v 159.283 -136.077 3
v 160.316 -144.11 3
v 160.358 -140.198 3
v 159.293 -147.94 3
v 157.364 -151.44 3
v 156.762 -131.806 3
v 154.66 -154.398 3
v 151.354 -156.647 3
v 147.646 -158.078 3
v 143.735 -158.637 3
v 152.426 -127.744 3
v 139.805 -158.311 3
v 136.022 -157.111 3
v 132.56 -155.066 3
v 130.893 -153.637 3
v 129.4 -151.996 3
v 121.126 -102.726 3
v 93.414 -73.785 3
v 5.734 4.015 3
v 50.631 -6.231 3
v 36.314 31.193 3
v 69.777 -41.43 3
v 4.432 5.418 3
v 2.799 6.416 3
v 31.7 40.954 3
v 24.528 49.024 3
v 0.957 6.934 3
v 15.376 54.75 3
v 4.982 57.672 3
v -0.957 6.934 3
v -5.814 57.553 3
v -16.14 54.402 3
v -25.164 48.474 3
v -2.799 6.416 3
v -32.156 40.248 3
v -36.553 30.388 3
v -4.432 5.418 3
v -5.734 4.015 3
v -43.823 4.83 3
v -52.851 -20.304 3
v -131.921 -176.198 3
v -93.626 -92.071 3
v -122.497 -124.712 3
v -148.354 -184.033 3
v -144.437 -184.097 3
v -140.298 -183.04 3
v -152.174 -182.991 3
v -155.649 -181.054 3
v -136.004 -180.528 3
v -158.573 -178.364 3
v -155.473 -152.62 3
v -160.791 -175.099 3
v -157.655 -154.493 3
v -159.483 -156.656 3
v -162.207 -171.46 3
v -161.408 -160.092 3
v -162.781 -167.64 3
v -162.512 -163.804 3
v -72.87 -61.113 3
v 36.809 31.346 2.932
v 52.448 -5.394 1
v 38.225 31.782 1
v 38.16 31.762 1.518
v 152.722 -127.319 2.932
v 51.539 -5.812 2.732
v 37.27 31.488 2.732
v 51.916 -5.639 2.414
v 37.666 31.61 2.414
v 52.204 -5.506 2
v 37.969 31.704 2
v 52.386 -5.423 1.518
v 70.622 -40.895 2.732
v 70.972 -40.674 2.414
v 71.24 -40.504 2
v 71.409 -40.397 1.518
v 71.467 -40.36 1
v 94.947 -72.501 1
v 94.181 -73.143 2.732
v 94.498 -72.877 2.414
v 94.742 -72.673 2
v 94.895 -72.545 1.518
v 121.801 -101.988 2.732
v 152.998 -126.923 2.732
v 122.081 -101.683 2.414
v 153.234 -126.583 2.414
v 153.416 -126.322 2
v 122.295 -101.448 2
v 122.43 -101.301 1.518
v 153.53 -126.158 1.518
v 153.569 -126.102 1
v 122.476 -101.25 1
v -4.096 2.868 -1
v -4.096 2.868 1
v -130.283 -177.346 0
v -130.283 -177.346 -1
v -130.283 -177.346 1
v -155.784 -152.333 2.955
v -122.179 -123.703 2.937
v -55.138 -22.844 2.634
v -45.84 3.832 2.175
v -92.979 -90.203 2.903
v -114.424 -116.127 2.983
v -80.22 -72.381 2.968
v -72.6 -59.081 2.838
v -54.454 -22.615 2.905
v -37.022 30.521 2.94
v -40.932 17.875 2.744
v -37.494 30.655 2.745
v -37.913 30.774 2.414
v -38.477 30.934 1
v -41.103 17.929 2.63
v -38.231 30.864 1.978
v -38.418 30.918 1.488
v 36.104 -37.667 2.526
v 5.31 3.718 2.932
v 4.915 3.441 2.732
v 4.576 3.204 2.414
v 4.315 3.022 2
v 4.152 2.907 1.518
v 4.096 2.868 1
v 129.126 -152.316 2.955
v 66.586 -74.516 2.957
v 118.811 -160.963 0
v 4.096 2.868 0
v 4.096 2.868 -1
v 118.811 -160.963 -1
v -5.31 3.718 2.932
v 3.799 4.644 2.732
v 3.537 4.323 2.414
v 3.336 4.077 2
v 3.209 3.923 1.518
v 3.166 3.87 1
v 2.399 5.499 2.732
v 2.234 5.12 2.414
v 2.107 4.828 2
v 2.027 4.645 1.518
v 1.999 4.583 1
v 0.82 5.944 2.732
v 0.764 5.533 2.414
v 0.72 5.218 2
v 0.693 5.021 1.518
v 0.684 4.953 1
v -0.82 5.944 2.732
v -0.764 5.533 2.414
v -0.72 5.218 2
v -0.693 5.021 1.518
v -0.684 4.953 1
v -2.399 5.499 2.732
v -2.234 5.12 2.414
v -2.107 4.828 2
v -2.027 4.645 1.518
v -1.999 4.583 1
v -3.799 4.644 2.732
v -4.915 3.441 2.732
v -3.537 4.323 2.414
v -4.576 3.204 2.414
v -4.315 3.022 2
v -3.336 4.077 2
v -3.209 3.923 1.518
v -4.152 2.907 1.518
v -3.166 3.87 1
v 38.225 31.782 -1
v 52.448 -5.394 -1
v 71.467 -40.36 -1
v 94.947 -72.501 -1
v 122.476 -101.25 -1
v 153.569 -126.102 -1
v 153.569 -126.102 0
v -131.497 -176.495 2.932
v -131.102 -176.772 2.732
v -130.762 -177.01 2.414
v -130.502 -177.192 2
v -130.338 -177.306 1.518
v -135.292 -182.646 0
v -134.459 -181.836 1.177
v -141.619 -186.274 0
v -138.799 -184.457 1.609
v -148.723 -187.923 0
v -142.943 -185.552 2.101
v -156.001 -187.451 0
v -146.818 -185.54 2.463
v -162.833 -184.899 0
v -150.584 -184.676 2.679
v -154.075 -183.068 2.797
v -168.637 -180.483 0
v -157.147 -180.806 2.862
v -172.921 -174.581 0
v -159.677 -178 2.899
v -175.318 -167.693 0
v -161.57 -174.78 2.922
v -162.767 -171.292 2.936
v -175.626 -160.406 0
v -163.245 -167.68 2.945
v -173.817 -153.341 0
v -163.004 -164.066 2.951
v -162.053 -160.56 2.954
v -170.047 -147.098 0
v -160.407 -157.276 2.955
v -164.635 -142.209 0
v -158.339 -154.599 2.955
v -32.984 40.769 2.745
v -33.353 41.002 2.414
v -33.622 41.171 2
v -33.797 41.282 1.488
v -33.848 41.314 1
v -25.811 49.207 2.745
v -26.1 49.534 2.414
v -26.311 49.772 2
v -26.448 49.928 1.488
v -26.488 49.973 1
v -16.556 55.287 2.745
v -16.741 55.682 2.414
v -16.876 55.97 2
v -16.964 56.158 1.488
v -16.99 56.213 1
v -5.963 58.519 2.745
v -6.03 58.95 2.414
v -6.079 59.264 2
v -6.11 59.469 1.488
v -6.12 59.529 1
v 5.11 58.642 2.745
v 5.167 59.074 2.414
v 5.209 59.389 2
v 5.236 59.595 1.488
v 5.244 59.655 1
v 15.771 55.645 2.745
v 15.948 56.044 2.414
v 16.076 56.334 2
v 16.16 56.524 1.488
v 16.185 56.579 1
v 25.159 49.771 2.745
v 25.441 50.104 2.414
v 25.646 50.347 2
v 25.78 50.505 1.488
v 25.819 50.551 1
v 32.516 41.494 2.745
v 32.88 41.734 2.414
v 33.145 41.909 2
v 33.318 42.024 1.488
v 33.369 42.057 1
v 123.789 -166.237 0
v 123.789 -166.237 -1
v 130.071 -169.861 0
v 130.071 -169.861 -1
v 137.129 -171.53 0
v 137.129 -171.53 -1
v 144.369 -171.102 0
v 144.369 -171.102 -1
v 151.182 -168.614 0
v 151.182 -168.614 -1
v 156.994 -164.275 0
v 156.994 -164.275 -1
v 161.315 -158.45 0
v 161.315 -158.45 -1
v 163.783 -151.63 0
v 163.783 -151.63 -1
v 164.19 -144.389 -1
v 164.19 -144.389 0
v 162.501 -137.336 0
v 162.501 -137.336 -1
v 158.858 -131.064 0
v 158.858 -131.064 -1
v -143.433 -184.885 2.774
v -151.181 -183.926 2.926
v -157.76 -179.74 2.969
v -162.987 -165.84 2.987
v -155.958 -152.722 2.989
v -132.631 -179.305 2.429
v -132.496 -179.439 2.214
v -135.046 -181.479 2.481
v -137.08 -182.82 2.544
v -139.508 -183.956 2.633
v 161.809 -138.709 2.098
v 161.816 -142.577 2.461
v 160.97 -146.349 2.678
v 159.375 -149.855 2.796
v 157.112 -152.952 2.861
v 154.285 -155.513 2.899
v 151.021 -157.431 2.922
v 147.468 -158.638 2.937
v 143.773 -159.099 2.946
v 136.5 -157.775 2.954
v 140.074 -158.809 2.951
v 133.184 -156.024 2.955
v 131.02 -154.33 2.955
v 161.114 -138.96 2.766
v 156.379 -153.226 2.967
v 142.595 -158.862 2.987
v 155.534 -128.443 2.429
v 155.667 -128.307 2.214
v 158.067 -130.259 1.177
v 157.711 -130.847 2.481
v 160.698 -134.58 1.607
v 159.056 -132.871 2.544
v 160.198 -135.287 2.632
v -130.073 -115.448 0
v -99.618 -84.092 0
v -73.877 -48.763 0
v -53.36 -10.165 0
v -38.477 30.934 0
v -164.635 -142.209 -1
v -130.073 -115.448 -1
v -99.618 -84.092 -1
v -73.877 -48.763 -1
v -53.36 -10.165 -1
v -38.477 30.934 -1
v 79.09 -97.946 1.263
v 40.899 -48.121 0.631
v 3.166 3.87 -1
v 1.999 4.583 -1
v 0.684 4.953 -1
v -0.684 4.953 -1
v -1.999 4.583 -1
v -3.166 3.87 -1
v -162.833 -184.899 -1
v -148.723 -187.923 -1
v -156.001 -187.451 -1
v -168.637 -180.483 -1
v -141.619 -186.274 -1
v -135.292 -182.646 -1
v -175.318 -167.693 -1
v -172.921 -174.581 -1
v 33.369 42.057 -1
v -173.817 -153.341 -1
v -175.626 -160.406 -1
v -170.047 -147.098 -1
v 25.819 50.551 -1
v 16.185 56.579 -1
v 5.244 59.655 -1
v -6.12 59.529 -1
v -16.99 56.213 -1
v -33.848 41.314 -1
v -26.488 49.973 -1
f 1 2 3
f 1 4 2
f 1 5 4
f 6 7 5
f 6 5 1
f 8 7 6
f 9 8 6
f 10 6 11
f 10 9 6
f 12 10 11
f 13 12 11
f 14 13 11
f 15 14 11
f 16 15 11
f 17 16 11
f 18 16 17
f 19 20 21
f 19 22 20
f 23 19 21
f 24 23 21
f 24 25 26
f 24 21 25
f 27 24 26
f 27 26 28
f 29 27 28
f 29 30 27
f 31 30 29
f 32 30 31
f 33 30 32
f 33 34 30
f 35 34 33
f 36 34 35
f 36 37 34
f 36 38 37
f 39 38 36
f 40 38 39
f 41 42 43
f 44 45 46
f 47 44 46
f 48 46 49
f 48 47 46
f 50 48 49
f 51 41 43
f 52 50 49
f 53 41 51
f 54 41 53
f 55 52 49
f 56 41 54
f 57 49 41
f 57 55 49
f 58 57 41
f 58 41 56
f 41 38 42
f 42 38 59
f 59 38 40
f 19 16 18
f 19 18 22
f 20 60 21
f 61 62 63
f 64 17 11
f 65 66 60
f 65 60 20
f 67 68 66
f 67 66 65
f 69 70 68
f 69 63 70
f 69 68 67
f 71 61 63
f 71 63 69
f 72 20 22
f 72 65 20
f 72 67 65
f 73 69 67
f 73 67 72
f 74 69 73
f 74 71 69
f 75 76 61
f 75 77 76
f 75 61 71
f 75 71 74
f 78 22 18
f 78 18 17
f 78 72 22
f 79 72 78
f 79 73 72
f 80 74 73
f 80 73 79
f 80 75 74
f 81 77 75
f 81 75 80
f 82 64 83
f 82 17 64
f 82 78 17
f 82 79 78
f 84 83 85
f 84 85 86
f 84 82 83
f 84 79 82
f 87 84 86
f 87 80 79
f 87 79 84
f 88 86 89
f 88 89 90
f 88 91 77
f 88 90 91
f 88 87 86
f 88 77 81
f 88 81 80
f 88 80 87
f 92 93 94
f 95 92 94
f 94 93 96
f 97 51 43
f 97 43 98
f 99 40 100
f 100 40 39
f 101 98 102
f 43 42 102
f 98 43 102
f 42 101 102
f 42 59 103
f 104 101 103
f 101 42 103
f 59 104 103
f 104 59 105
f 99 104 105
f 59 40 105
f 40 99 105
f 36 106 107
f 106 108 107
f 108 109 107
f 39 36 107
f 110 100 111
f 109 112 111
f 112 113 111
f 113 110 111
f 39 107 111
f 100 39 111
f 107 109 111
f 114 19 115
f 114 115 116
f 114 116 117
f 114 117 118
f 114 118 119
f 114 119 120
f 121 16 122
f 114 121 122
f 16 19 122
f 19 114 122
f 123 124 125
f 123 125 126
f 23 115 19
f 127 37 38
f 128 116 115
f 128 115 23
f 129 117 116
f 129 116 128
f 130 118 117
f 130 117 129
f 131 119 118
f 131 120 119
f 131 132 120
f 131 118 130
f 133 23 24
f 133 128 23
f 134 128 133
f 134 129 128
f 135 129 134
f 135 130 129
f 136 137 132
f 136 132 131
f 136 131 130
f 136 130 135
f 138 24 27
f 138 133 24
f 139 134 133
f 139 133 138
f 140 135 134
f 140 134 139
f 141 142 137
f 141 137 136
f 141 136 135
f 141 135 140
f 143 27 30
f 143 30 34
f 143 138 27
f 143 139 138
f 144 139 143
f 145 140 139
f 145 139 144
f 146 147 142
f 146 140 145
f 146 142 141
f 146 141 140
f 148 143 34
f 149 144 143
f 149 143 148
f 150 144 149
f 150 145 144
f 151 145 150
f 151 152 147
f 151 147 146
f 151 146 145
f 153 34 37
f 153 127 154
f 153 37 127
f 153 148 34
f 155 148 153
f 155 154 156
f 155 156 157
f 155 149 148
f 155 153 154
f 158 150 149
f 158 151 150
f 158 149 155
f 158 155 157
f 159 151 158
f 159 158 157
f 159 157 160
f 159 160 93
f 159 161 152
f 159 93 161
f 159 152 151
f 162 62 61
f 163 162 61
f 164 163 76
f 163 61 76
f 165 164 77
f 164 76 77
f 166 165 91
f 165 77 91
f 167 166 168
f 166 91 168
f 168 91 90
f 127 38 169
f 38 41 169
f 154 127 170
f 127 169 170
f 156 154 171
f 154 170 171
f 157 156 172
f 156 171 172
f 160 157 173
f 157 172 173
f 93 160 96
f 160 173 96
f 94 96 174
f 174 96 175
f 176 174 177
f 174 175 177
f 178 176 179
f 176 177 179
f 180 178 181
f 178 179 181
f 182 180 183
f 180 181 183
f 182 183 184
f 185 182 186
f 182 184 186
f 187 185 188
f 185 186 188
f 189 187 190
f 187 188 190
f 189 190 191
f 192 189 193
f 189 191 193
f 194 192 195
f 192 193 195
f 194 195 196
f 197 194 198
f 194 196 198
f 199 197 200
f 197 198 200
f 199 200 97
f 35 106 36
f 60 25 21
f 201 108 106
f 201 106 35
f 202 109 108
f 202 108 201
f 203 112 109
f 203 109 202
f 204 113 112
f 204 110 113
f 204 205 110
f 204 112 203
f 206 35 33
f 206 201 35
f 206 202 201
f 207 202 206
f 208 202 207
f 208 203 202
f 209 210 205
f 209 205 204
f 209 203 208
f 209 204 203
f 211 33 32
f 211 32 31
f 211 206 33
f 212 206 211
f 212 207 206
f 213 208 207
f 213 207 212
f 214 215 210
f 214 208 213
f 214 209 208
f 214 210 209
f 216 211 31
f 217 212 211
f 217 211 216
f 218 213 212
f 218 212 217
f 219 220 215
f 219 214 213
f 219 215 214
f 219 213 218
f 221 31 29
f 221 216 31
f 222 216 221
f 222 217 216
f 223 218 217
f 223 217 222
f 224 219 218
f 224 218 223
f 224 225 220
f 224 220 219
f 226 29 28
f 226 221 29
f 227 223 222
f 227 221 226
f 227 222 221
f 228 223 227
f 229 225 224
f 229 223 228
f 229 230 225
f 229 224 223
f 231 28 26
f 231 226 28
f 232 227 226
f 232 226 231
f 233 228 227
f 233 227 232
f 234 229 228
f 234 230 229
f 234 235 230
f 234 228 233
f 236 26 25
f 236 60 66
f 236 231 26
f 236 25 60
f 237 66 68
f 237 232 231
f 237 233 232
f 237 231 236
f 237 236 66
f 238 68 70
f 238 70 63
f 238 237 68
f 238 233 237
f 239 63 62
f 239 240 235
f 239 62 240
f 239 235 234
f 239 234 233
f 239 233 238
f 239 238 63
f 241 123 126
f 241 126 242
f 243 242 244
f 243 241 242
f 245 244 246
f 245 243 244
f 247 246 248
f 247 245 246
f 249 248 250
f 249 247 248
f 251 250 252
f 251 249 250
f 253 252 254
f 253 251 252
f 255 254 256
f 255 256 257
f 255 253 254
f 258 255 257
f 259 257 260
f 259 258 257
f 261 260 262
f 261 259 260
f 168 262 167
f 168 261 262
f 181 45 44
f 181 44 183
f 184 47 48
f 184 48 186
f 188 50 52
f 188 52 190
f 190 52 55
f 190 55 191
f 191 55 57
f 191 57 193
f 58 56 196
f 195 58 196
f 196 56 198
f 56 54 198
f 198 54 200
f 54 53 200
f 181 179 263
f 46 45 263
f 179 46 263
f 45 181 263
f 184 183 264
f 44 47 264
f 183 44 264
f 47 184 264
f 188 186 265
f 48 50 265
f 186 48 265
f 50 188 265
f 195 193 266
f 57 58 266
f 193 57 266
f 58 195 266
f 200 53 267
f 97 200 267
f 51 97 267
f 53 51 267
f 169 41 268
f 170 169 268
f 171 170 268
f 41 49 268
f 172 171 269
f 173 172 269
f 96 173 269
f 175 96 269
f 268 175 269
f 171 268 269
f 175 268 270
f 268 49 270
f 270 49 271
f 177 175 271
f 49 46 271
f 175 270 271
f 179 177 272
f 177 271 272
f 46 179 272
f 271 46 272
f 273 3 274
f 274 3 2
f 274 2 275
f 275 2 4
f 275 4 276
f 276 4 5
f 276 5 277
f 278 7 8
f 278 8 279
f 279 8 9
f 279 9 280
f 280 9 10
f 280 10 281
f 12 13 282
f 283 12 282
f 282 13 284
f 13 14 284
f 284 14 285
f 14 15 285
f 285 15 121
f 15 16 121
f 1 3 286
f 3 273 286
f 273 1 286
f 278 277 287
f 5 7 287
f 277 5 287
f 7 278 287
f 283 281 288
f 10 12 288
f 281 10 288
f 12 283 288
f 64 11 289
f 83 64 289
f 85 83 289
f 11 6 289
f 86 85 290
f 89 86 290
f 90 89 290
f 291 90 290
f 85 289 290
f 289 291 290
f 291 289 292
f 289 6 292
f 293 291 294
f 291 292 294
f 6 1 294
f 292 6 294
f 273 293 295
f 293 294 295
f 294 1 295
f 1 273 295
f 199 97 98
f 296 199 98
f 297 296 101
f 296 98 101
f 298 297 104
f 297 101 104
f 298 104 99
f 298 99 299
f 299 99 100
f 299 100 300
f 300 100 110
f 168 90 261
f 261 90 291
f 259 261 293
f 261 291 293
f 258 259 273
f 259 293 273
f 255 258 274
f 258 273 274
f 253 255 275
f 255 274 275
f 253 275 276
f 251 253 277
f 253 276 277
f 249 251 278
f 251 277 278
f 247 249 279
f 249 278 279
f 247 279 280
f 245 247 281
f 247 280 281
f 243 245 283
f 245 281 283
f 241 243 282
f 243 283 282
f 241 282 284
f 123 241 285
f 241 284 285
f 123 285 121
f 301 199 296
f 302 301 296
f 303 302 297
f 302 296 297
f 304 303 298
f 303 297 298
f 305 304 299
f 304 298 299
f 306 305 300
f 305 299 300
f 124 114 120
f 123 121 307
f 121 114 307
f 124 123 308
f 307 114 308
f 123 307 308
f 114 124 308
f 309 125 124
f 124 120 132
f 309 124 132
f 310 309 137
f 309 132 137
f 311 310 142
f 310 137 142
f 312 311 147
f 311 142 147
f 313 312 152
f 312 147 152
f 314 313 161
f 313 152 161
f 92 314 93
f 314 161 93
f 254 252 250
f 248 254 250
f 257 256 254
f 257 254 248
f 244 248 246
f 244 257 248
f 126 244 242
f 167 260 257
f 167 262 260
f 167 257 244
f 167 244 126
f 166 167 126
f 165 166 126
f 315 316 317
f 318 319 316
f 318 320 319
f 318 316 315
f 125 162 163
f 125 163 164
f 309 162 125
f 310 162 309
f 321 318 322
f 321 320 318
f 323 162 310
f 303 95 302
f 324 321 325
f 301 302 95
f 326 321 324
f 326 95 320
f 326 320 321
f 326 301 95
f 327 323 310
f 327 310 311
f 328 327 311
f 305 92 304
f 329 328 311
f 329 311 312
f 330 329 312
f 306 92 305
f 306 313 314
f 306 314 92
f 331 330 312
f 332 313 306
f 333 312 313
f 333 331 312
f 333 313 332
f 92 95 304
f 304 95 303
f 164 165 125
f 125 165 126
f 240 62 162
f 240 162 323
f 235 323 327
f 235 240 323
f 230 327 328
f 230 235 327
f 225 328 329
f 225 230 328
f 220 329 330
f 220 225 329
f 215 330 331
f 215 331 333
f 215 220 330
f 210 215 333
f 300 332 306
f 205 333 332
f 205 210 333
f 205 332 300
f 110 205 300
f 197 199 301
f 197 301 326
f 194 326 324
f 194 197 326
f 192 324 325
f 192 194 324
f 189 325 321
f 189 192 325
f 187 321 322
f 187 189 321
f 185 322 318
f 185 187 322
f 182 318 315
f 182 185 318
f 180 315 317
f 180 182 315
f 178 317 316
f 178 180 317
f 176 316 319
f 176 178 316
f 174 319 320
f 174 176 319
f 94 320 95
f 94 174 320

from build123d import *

# Parameters (mm, degrees)
PAD_DEPTH = 1
FILLET_R  = 2


with BuildPart() as part:
    # Sketch → Loft section 0
    with BuildSketch(Plane.XY):
        with BuildLine():
            Line((-4.09576, 2.867882), (-130.282576, -177.345568))
            ThreePointArc((-164.635111, -142.209053), (-168.63735, -180.483273), (-130.282576, -177.345568))
            ThreePointArc((-164.635111, -142.209053), (-86.123884, -66.881649), (-38.476503, 30.934289))
            ThreePointArc((38.22531, 31.782432), (-0.442279, 59.997555), (-38.476503, 30.934289))
            ThreePointArc((38.22531, 31.782432), (82.673152, -56.820578), (153.568717, -126.102055))
            ThreePointArc((118.811047, -160.962527), (156.993603, -164.274662), (153.568717, -126.102055))
            Line((4.09576, 2.867882), (118.811047, -160.962527))
            ThreePointArc((4.09576, 2.867882), (0, 5), (-4.09576, 2.867882))
        make_face()
    # Sketch001 → Loft section 1
    with BuildSketch(Plane.XY.offset(3)):
        with BuildLine():
            Line((-4.09576, 2.867882), (-130.282576, -177.345568))
            ThreePointArc((-155.648016, -152.488447), (-157.625766, -179.877279), (-130.282576, -177.345568))
            ThreePointArc((-155.648016, -152.488447), (-79.841331, -71.777908), (-38.476503, 30.934289))
            ThreePointArc((38.22531, 31.782432), (-0.442279, 59.997555), (-38.476503, 30.934289))
            ThreePointArc((38.22531, 31.782432), (82.673152, -56.820578), (153.568717, -126.102055))
            ThreePointArc((129.282887, -152.184683), (156.461518, -153.143294), (153.568717, -126.102055))
            Line((4.09576, 2.867882), (129.282887, -152.184683))
            ThreePointArc((4.09576, 2.867882), (0, 5), (-4.09576, 2.867882))
        make_face()
    loft()

    # Sketch → Pad (new body)
    with BuildSketch(Plane.XY):
        with BuildLine():
            Line((-4.09576, 2.867882), (-130.282576, -177.345568))
            ThreePointArc((-164.635111, -142.209053), (-168.63735, -180.483273), (-130.282576, -177.345568))
            ThreePointArc((-164.635111, -142.209053), (-86.123884, -66.881649), (-38.476503, 30.934289))
            ThreePointArc((38.22531, 31.782432), (-0.442279, 59.997555), (-38.476503, 30.934289))
            ThreePointArc((38.22531, 31.782432), (82.673152, -56.820578), (153.568717, -126.102055))
            ThreePointArc((118.811047, -160.962527), (156.993603, -164.274662), (153.568717, -126.102055))
            Line((4.09576, 2.867882), (118.811047, -160.962527))
            ThreePointArc((4.09576, 2.867882), (0, 5), (-4.09576, 2.867882))
        make_face()
    extrude(amount=-PAD_DEPTH)

    # Fillet
    fillet_edges = [part.edges().sort_by_distance(p)[0] for p in [
        (0, 5, 3),
        (-67.189168, -87.238843, 3),
        (-157.625766, -179.877279, 3),
        (-79.841331, -71.777908, 3),
        (-0.442279, 59.997555, 3),
        (82.673152, -56.820578, 3),
        (156.461518, -153.143294, 3),
        (66.689324, -74.6584, 3),
    ]]
    fillet(fillet_edges, radius=FILLET_R)


solid = part.part
